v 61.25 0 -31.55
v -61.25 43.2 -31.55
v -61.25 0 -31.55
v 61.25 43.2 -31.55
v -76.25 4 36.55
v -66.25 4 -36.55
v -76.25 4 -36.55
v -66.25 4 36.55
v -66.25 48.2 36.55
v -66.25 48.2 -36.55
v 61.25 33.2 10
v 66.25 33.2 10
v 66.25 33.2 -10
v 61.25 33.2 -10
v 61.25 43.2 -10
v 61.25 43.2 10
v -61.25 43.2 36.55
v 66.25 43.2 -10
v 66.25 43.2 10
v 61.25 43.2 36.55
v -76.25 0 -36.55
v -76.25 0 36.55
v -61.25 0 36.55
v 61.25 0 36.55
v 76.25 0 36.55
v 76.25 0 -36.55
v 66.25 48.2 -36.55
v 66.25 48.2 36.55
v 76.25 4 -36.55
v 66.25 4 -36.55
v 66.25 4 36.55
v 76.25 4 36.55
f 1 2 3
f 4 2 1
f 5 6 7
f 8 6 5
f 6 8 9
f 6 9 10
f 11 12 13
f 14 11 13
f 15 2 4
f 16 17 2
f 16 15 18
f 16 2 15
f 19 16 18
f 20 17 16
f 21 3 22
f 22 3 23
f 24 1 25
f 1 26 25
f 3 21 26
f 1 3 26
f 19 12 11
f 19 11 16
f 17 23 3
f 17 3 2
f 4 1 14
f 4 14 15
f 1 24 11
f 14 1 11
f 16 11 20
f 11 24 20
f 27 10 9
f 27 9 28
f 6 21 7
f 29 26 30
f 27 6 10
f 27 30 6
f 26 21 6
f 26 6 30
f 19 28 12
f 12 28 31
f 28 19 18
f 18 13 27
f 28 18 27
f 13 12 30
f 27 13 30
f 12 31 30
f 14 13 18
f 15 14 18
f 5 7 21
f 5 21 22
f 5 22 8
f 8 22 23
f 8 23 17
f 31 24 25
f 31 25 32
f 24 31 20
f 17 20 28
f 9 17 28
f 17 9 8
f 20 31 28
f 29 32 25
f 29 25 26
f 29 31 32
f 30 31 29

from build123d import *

# Parameters (mm, degrees)
SKETCH_1_W          = 132.5
SKETCH_1_H          = 73.1
EXTRUDE_1_DEPTH     = 48.2
SKETCH_3_W          = 122.5
SKETCH_3_H          = 43.2
CUT_EXTRUDE_1_DEPTH = 68.1
SKETCH_7_W          = 20
SKETCH_7_H          = 10
CUT_EXTRUDE_2_DEPTH = 10
SKETCH_8_W          = 73.1
SKETCH_8_H          = 4
EXTRUDE_2_DEPTH     = 10
SKETCH_9_W          = 73.1
SKETCH_9_H          = 4
EXTRUDE_3_DEPTH     = 10


with BuildPart() as part:
    # 草圖1 → 填料-伸長1 (new body)
    with BuildSketch(Plane(origin=(0, 0, 0), x_dir=(1, 0, 0), z_dir=(0, 1, 0))):
        Rectangle(SKETCH_1_W, SKETCH_1_H)
    extrude(amount=EXTRUDE_1_DEPTH)

    # 草圖3 → 除料-伸長1 (cut)
    with BuildSketch(Plane.XY.offset(36.55)):
        with Locations((0, 21.6)):
            Rectangle(SKETCH_3_W, SKETCH_3_H)
    extrude(amount=-CUT_EXTRUDE_1_DEPTH, mode=Mode.SUBTRACT)

    # 草圖7 → 除料-伸長2 (cut)
    with BuildSketch(Plane(origin=(66.25, 0, 0), x_dir=(0, 0, -1), z_dir=(1, 0, 0))):
        with Locations((0, 38.2)):
            Rectangle(SKETCH_7_W, SKETCH_7_H)
    extrude(amount=-CUT_EXTRUDE_2_DEPTH, mode=Mode.SUBTRACT)

    # 草圖8 → 填料-伸長2 (add)
    with BuildSketch(Plane(origin=(66.25, 0, 0), x_dir=(0, 0, -1), z_dir=(1, 0, 0))):
        with Locations((0, 2)):
            Rectangle(SKETCH_8_W, SKETCH_8_H)
    extrude(amount=EXTRUDE_2_DEPTH)

    # 草圖9 → 填料-伸長3 (add)
    with BuildSketch(Plane.ZY.offset(66.25)):
        with Locations((0, 2)):
            Rectangle(SKETCH_9_W, SKETCH_9_H)
    extrude(amount=EXTRUDE_3_DEPTH)


solid = part.part
